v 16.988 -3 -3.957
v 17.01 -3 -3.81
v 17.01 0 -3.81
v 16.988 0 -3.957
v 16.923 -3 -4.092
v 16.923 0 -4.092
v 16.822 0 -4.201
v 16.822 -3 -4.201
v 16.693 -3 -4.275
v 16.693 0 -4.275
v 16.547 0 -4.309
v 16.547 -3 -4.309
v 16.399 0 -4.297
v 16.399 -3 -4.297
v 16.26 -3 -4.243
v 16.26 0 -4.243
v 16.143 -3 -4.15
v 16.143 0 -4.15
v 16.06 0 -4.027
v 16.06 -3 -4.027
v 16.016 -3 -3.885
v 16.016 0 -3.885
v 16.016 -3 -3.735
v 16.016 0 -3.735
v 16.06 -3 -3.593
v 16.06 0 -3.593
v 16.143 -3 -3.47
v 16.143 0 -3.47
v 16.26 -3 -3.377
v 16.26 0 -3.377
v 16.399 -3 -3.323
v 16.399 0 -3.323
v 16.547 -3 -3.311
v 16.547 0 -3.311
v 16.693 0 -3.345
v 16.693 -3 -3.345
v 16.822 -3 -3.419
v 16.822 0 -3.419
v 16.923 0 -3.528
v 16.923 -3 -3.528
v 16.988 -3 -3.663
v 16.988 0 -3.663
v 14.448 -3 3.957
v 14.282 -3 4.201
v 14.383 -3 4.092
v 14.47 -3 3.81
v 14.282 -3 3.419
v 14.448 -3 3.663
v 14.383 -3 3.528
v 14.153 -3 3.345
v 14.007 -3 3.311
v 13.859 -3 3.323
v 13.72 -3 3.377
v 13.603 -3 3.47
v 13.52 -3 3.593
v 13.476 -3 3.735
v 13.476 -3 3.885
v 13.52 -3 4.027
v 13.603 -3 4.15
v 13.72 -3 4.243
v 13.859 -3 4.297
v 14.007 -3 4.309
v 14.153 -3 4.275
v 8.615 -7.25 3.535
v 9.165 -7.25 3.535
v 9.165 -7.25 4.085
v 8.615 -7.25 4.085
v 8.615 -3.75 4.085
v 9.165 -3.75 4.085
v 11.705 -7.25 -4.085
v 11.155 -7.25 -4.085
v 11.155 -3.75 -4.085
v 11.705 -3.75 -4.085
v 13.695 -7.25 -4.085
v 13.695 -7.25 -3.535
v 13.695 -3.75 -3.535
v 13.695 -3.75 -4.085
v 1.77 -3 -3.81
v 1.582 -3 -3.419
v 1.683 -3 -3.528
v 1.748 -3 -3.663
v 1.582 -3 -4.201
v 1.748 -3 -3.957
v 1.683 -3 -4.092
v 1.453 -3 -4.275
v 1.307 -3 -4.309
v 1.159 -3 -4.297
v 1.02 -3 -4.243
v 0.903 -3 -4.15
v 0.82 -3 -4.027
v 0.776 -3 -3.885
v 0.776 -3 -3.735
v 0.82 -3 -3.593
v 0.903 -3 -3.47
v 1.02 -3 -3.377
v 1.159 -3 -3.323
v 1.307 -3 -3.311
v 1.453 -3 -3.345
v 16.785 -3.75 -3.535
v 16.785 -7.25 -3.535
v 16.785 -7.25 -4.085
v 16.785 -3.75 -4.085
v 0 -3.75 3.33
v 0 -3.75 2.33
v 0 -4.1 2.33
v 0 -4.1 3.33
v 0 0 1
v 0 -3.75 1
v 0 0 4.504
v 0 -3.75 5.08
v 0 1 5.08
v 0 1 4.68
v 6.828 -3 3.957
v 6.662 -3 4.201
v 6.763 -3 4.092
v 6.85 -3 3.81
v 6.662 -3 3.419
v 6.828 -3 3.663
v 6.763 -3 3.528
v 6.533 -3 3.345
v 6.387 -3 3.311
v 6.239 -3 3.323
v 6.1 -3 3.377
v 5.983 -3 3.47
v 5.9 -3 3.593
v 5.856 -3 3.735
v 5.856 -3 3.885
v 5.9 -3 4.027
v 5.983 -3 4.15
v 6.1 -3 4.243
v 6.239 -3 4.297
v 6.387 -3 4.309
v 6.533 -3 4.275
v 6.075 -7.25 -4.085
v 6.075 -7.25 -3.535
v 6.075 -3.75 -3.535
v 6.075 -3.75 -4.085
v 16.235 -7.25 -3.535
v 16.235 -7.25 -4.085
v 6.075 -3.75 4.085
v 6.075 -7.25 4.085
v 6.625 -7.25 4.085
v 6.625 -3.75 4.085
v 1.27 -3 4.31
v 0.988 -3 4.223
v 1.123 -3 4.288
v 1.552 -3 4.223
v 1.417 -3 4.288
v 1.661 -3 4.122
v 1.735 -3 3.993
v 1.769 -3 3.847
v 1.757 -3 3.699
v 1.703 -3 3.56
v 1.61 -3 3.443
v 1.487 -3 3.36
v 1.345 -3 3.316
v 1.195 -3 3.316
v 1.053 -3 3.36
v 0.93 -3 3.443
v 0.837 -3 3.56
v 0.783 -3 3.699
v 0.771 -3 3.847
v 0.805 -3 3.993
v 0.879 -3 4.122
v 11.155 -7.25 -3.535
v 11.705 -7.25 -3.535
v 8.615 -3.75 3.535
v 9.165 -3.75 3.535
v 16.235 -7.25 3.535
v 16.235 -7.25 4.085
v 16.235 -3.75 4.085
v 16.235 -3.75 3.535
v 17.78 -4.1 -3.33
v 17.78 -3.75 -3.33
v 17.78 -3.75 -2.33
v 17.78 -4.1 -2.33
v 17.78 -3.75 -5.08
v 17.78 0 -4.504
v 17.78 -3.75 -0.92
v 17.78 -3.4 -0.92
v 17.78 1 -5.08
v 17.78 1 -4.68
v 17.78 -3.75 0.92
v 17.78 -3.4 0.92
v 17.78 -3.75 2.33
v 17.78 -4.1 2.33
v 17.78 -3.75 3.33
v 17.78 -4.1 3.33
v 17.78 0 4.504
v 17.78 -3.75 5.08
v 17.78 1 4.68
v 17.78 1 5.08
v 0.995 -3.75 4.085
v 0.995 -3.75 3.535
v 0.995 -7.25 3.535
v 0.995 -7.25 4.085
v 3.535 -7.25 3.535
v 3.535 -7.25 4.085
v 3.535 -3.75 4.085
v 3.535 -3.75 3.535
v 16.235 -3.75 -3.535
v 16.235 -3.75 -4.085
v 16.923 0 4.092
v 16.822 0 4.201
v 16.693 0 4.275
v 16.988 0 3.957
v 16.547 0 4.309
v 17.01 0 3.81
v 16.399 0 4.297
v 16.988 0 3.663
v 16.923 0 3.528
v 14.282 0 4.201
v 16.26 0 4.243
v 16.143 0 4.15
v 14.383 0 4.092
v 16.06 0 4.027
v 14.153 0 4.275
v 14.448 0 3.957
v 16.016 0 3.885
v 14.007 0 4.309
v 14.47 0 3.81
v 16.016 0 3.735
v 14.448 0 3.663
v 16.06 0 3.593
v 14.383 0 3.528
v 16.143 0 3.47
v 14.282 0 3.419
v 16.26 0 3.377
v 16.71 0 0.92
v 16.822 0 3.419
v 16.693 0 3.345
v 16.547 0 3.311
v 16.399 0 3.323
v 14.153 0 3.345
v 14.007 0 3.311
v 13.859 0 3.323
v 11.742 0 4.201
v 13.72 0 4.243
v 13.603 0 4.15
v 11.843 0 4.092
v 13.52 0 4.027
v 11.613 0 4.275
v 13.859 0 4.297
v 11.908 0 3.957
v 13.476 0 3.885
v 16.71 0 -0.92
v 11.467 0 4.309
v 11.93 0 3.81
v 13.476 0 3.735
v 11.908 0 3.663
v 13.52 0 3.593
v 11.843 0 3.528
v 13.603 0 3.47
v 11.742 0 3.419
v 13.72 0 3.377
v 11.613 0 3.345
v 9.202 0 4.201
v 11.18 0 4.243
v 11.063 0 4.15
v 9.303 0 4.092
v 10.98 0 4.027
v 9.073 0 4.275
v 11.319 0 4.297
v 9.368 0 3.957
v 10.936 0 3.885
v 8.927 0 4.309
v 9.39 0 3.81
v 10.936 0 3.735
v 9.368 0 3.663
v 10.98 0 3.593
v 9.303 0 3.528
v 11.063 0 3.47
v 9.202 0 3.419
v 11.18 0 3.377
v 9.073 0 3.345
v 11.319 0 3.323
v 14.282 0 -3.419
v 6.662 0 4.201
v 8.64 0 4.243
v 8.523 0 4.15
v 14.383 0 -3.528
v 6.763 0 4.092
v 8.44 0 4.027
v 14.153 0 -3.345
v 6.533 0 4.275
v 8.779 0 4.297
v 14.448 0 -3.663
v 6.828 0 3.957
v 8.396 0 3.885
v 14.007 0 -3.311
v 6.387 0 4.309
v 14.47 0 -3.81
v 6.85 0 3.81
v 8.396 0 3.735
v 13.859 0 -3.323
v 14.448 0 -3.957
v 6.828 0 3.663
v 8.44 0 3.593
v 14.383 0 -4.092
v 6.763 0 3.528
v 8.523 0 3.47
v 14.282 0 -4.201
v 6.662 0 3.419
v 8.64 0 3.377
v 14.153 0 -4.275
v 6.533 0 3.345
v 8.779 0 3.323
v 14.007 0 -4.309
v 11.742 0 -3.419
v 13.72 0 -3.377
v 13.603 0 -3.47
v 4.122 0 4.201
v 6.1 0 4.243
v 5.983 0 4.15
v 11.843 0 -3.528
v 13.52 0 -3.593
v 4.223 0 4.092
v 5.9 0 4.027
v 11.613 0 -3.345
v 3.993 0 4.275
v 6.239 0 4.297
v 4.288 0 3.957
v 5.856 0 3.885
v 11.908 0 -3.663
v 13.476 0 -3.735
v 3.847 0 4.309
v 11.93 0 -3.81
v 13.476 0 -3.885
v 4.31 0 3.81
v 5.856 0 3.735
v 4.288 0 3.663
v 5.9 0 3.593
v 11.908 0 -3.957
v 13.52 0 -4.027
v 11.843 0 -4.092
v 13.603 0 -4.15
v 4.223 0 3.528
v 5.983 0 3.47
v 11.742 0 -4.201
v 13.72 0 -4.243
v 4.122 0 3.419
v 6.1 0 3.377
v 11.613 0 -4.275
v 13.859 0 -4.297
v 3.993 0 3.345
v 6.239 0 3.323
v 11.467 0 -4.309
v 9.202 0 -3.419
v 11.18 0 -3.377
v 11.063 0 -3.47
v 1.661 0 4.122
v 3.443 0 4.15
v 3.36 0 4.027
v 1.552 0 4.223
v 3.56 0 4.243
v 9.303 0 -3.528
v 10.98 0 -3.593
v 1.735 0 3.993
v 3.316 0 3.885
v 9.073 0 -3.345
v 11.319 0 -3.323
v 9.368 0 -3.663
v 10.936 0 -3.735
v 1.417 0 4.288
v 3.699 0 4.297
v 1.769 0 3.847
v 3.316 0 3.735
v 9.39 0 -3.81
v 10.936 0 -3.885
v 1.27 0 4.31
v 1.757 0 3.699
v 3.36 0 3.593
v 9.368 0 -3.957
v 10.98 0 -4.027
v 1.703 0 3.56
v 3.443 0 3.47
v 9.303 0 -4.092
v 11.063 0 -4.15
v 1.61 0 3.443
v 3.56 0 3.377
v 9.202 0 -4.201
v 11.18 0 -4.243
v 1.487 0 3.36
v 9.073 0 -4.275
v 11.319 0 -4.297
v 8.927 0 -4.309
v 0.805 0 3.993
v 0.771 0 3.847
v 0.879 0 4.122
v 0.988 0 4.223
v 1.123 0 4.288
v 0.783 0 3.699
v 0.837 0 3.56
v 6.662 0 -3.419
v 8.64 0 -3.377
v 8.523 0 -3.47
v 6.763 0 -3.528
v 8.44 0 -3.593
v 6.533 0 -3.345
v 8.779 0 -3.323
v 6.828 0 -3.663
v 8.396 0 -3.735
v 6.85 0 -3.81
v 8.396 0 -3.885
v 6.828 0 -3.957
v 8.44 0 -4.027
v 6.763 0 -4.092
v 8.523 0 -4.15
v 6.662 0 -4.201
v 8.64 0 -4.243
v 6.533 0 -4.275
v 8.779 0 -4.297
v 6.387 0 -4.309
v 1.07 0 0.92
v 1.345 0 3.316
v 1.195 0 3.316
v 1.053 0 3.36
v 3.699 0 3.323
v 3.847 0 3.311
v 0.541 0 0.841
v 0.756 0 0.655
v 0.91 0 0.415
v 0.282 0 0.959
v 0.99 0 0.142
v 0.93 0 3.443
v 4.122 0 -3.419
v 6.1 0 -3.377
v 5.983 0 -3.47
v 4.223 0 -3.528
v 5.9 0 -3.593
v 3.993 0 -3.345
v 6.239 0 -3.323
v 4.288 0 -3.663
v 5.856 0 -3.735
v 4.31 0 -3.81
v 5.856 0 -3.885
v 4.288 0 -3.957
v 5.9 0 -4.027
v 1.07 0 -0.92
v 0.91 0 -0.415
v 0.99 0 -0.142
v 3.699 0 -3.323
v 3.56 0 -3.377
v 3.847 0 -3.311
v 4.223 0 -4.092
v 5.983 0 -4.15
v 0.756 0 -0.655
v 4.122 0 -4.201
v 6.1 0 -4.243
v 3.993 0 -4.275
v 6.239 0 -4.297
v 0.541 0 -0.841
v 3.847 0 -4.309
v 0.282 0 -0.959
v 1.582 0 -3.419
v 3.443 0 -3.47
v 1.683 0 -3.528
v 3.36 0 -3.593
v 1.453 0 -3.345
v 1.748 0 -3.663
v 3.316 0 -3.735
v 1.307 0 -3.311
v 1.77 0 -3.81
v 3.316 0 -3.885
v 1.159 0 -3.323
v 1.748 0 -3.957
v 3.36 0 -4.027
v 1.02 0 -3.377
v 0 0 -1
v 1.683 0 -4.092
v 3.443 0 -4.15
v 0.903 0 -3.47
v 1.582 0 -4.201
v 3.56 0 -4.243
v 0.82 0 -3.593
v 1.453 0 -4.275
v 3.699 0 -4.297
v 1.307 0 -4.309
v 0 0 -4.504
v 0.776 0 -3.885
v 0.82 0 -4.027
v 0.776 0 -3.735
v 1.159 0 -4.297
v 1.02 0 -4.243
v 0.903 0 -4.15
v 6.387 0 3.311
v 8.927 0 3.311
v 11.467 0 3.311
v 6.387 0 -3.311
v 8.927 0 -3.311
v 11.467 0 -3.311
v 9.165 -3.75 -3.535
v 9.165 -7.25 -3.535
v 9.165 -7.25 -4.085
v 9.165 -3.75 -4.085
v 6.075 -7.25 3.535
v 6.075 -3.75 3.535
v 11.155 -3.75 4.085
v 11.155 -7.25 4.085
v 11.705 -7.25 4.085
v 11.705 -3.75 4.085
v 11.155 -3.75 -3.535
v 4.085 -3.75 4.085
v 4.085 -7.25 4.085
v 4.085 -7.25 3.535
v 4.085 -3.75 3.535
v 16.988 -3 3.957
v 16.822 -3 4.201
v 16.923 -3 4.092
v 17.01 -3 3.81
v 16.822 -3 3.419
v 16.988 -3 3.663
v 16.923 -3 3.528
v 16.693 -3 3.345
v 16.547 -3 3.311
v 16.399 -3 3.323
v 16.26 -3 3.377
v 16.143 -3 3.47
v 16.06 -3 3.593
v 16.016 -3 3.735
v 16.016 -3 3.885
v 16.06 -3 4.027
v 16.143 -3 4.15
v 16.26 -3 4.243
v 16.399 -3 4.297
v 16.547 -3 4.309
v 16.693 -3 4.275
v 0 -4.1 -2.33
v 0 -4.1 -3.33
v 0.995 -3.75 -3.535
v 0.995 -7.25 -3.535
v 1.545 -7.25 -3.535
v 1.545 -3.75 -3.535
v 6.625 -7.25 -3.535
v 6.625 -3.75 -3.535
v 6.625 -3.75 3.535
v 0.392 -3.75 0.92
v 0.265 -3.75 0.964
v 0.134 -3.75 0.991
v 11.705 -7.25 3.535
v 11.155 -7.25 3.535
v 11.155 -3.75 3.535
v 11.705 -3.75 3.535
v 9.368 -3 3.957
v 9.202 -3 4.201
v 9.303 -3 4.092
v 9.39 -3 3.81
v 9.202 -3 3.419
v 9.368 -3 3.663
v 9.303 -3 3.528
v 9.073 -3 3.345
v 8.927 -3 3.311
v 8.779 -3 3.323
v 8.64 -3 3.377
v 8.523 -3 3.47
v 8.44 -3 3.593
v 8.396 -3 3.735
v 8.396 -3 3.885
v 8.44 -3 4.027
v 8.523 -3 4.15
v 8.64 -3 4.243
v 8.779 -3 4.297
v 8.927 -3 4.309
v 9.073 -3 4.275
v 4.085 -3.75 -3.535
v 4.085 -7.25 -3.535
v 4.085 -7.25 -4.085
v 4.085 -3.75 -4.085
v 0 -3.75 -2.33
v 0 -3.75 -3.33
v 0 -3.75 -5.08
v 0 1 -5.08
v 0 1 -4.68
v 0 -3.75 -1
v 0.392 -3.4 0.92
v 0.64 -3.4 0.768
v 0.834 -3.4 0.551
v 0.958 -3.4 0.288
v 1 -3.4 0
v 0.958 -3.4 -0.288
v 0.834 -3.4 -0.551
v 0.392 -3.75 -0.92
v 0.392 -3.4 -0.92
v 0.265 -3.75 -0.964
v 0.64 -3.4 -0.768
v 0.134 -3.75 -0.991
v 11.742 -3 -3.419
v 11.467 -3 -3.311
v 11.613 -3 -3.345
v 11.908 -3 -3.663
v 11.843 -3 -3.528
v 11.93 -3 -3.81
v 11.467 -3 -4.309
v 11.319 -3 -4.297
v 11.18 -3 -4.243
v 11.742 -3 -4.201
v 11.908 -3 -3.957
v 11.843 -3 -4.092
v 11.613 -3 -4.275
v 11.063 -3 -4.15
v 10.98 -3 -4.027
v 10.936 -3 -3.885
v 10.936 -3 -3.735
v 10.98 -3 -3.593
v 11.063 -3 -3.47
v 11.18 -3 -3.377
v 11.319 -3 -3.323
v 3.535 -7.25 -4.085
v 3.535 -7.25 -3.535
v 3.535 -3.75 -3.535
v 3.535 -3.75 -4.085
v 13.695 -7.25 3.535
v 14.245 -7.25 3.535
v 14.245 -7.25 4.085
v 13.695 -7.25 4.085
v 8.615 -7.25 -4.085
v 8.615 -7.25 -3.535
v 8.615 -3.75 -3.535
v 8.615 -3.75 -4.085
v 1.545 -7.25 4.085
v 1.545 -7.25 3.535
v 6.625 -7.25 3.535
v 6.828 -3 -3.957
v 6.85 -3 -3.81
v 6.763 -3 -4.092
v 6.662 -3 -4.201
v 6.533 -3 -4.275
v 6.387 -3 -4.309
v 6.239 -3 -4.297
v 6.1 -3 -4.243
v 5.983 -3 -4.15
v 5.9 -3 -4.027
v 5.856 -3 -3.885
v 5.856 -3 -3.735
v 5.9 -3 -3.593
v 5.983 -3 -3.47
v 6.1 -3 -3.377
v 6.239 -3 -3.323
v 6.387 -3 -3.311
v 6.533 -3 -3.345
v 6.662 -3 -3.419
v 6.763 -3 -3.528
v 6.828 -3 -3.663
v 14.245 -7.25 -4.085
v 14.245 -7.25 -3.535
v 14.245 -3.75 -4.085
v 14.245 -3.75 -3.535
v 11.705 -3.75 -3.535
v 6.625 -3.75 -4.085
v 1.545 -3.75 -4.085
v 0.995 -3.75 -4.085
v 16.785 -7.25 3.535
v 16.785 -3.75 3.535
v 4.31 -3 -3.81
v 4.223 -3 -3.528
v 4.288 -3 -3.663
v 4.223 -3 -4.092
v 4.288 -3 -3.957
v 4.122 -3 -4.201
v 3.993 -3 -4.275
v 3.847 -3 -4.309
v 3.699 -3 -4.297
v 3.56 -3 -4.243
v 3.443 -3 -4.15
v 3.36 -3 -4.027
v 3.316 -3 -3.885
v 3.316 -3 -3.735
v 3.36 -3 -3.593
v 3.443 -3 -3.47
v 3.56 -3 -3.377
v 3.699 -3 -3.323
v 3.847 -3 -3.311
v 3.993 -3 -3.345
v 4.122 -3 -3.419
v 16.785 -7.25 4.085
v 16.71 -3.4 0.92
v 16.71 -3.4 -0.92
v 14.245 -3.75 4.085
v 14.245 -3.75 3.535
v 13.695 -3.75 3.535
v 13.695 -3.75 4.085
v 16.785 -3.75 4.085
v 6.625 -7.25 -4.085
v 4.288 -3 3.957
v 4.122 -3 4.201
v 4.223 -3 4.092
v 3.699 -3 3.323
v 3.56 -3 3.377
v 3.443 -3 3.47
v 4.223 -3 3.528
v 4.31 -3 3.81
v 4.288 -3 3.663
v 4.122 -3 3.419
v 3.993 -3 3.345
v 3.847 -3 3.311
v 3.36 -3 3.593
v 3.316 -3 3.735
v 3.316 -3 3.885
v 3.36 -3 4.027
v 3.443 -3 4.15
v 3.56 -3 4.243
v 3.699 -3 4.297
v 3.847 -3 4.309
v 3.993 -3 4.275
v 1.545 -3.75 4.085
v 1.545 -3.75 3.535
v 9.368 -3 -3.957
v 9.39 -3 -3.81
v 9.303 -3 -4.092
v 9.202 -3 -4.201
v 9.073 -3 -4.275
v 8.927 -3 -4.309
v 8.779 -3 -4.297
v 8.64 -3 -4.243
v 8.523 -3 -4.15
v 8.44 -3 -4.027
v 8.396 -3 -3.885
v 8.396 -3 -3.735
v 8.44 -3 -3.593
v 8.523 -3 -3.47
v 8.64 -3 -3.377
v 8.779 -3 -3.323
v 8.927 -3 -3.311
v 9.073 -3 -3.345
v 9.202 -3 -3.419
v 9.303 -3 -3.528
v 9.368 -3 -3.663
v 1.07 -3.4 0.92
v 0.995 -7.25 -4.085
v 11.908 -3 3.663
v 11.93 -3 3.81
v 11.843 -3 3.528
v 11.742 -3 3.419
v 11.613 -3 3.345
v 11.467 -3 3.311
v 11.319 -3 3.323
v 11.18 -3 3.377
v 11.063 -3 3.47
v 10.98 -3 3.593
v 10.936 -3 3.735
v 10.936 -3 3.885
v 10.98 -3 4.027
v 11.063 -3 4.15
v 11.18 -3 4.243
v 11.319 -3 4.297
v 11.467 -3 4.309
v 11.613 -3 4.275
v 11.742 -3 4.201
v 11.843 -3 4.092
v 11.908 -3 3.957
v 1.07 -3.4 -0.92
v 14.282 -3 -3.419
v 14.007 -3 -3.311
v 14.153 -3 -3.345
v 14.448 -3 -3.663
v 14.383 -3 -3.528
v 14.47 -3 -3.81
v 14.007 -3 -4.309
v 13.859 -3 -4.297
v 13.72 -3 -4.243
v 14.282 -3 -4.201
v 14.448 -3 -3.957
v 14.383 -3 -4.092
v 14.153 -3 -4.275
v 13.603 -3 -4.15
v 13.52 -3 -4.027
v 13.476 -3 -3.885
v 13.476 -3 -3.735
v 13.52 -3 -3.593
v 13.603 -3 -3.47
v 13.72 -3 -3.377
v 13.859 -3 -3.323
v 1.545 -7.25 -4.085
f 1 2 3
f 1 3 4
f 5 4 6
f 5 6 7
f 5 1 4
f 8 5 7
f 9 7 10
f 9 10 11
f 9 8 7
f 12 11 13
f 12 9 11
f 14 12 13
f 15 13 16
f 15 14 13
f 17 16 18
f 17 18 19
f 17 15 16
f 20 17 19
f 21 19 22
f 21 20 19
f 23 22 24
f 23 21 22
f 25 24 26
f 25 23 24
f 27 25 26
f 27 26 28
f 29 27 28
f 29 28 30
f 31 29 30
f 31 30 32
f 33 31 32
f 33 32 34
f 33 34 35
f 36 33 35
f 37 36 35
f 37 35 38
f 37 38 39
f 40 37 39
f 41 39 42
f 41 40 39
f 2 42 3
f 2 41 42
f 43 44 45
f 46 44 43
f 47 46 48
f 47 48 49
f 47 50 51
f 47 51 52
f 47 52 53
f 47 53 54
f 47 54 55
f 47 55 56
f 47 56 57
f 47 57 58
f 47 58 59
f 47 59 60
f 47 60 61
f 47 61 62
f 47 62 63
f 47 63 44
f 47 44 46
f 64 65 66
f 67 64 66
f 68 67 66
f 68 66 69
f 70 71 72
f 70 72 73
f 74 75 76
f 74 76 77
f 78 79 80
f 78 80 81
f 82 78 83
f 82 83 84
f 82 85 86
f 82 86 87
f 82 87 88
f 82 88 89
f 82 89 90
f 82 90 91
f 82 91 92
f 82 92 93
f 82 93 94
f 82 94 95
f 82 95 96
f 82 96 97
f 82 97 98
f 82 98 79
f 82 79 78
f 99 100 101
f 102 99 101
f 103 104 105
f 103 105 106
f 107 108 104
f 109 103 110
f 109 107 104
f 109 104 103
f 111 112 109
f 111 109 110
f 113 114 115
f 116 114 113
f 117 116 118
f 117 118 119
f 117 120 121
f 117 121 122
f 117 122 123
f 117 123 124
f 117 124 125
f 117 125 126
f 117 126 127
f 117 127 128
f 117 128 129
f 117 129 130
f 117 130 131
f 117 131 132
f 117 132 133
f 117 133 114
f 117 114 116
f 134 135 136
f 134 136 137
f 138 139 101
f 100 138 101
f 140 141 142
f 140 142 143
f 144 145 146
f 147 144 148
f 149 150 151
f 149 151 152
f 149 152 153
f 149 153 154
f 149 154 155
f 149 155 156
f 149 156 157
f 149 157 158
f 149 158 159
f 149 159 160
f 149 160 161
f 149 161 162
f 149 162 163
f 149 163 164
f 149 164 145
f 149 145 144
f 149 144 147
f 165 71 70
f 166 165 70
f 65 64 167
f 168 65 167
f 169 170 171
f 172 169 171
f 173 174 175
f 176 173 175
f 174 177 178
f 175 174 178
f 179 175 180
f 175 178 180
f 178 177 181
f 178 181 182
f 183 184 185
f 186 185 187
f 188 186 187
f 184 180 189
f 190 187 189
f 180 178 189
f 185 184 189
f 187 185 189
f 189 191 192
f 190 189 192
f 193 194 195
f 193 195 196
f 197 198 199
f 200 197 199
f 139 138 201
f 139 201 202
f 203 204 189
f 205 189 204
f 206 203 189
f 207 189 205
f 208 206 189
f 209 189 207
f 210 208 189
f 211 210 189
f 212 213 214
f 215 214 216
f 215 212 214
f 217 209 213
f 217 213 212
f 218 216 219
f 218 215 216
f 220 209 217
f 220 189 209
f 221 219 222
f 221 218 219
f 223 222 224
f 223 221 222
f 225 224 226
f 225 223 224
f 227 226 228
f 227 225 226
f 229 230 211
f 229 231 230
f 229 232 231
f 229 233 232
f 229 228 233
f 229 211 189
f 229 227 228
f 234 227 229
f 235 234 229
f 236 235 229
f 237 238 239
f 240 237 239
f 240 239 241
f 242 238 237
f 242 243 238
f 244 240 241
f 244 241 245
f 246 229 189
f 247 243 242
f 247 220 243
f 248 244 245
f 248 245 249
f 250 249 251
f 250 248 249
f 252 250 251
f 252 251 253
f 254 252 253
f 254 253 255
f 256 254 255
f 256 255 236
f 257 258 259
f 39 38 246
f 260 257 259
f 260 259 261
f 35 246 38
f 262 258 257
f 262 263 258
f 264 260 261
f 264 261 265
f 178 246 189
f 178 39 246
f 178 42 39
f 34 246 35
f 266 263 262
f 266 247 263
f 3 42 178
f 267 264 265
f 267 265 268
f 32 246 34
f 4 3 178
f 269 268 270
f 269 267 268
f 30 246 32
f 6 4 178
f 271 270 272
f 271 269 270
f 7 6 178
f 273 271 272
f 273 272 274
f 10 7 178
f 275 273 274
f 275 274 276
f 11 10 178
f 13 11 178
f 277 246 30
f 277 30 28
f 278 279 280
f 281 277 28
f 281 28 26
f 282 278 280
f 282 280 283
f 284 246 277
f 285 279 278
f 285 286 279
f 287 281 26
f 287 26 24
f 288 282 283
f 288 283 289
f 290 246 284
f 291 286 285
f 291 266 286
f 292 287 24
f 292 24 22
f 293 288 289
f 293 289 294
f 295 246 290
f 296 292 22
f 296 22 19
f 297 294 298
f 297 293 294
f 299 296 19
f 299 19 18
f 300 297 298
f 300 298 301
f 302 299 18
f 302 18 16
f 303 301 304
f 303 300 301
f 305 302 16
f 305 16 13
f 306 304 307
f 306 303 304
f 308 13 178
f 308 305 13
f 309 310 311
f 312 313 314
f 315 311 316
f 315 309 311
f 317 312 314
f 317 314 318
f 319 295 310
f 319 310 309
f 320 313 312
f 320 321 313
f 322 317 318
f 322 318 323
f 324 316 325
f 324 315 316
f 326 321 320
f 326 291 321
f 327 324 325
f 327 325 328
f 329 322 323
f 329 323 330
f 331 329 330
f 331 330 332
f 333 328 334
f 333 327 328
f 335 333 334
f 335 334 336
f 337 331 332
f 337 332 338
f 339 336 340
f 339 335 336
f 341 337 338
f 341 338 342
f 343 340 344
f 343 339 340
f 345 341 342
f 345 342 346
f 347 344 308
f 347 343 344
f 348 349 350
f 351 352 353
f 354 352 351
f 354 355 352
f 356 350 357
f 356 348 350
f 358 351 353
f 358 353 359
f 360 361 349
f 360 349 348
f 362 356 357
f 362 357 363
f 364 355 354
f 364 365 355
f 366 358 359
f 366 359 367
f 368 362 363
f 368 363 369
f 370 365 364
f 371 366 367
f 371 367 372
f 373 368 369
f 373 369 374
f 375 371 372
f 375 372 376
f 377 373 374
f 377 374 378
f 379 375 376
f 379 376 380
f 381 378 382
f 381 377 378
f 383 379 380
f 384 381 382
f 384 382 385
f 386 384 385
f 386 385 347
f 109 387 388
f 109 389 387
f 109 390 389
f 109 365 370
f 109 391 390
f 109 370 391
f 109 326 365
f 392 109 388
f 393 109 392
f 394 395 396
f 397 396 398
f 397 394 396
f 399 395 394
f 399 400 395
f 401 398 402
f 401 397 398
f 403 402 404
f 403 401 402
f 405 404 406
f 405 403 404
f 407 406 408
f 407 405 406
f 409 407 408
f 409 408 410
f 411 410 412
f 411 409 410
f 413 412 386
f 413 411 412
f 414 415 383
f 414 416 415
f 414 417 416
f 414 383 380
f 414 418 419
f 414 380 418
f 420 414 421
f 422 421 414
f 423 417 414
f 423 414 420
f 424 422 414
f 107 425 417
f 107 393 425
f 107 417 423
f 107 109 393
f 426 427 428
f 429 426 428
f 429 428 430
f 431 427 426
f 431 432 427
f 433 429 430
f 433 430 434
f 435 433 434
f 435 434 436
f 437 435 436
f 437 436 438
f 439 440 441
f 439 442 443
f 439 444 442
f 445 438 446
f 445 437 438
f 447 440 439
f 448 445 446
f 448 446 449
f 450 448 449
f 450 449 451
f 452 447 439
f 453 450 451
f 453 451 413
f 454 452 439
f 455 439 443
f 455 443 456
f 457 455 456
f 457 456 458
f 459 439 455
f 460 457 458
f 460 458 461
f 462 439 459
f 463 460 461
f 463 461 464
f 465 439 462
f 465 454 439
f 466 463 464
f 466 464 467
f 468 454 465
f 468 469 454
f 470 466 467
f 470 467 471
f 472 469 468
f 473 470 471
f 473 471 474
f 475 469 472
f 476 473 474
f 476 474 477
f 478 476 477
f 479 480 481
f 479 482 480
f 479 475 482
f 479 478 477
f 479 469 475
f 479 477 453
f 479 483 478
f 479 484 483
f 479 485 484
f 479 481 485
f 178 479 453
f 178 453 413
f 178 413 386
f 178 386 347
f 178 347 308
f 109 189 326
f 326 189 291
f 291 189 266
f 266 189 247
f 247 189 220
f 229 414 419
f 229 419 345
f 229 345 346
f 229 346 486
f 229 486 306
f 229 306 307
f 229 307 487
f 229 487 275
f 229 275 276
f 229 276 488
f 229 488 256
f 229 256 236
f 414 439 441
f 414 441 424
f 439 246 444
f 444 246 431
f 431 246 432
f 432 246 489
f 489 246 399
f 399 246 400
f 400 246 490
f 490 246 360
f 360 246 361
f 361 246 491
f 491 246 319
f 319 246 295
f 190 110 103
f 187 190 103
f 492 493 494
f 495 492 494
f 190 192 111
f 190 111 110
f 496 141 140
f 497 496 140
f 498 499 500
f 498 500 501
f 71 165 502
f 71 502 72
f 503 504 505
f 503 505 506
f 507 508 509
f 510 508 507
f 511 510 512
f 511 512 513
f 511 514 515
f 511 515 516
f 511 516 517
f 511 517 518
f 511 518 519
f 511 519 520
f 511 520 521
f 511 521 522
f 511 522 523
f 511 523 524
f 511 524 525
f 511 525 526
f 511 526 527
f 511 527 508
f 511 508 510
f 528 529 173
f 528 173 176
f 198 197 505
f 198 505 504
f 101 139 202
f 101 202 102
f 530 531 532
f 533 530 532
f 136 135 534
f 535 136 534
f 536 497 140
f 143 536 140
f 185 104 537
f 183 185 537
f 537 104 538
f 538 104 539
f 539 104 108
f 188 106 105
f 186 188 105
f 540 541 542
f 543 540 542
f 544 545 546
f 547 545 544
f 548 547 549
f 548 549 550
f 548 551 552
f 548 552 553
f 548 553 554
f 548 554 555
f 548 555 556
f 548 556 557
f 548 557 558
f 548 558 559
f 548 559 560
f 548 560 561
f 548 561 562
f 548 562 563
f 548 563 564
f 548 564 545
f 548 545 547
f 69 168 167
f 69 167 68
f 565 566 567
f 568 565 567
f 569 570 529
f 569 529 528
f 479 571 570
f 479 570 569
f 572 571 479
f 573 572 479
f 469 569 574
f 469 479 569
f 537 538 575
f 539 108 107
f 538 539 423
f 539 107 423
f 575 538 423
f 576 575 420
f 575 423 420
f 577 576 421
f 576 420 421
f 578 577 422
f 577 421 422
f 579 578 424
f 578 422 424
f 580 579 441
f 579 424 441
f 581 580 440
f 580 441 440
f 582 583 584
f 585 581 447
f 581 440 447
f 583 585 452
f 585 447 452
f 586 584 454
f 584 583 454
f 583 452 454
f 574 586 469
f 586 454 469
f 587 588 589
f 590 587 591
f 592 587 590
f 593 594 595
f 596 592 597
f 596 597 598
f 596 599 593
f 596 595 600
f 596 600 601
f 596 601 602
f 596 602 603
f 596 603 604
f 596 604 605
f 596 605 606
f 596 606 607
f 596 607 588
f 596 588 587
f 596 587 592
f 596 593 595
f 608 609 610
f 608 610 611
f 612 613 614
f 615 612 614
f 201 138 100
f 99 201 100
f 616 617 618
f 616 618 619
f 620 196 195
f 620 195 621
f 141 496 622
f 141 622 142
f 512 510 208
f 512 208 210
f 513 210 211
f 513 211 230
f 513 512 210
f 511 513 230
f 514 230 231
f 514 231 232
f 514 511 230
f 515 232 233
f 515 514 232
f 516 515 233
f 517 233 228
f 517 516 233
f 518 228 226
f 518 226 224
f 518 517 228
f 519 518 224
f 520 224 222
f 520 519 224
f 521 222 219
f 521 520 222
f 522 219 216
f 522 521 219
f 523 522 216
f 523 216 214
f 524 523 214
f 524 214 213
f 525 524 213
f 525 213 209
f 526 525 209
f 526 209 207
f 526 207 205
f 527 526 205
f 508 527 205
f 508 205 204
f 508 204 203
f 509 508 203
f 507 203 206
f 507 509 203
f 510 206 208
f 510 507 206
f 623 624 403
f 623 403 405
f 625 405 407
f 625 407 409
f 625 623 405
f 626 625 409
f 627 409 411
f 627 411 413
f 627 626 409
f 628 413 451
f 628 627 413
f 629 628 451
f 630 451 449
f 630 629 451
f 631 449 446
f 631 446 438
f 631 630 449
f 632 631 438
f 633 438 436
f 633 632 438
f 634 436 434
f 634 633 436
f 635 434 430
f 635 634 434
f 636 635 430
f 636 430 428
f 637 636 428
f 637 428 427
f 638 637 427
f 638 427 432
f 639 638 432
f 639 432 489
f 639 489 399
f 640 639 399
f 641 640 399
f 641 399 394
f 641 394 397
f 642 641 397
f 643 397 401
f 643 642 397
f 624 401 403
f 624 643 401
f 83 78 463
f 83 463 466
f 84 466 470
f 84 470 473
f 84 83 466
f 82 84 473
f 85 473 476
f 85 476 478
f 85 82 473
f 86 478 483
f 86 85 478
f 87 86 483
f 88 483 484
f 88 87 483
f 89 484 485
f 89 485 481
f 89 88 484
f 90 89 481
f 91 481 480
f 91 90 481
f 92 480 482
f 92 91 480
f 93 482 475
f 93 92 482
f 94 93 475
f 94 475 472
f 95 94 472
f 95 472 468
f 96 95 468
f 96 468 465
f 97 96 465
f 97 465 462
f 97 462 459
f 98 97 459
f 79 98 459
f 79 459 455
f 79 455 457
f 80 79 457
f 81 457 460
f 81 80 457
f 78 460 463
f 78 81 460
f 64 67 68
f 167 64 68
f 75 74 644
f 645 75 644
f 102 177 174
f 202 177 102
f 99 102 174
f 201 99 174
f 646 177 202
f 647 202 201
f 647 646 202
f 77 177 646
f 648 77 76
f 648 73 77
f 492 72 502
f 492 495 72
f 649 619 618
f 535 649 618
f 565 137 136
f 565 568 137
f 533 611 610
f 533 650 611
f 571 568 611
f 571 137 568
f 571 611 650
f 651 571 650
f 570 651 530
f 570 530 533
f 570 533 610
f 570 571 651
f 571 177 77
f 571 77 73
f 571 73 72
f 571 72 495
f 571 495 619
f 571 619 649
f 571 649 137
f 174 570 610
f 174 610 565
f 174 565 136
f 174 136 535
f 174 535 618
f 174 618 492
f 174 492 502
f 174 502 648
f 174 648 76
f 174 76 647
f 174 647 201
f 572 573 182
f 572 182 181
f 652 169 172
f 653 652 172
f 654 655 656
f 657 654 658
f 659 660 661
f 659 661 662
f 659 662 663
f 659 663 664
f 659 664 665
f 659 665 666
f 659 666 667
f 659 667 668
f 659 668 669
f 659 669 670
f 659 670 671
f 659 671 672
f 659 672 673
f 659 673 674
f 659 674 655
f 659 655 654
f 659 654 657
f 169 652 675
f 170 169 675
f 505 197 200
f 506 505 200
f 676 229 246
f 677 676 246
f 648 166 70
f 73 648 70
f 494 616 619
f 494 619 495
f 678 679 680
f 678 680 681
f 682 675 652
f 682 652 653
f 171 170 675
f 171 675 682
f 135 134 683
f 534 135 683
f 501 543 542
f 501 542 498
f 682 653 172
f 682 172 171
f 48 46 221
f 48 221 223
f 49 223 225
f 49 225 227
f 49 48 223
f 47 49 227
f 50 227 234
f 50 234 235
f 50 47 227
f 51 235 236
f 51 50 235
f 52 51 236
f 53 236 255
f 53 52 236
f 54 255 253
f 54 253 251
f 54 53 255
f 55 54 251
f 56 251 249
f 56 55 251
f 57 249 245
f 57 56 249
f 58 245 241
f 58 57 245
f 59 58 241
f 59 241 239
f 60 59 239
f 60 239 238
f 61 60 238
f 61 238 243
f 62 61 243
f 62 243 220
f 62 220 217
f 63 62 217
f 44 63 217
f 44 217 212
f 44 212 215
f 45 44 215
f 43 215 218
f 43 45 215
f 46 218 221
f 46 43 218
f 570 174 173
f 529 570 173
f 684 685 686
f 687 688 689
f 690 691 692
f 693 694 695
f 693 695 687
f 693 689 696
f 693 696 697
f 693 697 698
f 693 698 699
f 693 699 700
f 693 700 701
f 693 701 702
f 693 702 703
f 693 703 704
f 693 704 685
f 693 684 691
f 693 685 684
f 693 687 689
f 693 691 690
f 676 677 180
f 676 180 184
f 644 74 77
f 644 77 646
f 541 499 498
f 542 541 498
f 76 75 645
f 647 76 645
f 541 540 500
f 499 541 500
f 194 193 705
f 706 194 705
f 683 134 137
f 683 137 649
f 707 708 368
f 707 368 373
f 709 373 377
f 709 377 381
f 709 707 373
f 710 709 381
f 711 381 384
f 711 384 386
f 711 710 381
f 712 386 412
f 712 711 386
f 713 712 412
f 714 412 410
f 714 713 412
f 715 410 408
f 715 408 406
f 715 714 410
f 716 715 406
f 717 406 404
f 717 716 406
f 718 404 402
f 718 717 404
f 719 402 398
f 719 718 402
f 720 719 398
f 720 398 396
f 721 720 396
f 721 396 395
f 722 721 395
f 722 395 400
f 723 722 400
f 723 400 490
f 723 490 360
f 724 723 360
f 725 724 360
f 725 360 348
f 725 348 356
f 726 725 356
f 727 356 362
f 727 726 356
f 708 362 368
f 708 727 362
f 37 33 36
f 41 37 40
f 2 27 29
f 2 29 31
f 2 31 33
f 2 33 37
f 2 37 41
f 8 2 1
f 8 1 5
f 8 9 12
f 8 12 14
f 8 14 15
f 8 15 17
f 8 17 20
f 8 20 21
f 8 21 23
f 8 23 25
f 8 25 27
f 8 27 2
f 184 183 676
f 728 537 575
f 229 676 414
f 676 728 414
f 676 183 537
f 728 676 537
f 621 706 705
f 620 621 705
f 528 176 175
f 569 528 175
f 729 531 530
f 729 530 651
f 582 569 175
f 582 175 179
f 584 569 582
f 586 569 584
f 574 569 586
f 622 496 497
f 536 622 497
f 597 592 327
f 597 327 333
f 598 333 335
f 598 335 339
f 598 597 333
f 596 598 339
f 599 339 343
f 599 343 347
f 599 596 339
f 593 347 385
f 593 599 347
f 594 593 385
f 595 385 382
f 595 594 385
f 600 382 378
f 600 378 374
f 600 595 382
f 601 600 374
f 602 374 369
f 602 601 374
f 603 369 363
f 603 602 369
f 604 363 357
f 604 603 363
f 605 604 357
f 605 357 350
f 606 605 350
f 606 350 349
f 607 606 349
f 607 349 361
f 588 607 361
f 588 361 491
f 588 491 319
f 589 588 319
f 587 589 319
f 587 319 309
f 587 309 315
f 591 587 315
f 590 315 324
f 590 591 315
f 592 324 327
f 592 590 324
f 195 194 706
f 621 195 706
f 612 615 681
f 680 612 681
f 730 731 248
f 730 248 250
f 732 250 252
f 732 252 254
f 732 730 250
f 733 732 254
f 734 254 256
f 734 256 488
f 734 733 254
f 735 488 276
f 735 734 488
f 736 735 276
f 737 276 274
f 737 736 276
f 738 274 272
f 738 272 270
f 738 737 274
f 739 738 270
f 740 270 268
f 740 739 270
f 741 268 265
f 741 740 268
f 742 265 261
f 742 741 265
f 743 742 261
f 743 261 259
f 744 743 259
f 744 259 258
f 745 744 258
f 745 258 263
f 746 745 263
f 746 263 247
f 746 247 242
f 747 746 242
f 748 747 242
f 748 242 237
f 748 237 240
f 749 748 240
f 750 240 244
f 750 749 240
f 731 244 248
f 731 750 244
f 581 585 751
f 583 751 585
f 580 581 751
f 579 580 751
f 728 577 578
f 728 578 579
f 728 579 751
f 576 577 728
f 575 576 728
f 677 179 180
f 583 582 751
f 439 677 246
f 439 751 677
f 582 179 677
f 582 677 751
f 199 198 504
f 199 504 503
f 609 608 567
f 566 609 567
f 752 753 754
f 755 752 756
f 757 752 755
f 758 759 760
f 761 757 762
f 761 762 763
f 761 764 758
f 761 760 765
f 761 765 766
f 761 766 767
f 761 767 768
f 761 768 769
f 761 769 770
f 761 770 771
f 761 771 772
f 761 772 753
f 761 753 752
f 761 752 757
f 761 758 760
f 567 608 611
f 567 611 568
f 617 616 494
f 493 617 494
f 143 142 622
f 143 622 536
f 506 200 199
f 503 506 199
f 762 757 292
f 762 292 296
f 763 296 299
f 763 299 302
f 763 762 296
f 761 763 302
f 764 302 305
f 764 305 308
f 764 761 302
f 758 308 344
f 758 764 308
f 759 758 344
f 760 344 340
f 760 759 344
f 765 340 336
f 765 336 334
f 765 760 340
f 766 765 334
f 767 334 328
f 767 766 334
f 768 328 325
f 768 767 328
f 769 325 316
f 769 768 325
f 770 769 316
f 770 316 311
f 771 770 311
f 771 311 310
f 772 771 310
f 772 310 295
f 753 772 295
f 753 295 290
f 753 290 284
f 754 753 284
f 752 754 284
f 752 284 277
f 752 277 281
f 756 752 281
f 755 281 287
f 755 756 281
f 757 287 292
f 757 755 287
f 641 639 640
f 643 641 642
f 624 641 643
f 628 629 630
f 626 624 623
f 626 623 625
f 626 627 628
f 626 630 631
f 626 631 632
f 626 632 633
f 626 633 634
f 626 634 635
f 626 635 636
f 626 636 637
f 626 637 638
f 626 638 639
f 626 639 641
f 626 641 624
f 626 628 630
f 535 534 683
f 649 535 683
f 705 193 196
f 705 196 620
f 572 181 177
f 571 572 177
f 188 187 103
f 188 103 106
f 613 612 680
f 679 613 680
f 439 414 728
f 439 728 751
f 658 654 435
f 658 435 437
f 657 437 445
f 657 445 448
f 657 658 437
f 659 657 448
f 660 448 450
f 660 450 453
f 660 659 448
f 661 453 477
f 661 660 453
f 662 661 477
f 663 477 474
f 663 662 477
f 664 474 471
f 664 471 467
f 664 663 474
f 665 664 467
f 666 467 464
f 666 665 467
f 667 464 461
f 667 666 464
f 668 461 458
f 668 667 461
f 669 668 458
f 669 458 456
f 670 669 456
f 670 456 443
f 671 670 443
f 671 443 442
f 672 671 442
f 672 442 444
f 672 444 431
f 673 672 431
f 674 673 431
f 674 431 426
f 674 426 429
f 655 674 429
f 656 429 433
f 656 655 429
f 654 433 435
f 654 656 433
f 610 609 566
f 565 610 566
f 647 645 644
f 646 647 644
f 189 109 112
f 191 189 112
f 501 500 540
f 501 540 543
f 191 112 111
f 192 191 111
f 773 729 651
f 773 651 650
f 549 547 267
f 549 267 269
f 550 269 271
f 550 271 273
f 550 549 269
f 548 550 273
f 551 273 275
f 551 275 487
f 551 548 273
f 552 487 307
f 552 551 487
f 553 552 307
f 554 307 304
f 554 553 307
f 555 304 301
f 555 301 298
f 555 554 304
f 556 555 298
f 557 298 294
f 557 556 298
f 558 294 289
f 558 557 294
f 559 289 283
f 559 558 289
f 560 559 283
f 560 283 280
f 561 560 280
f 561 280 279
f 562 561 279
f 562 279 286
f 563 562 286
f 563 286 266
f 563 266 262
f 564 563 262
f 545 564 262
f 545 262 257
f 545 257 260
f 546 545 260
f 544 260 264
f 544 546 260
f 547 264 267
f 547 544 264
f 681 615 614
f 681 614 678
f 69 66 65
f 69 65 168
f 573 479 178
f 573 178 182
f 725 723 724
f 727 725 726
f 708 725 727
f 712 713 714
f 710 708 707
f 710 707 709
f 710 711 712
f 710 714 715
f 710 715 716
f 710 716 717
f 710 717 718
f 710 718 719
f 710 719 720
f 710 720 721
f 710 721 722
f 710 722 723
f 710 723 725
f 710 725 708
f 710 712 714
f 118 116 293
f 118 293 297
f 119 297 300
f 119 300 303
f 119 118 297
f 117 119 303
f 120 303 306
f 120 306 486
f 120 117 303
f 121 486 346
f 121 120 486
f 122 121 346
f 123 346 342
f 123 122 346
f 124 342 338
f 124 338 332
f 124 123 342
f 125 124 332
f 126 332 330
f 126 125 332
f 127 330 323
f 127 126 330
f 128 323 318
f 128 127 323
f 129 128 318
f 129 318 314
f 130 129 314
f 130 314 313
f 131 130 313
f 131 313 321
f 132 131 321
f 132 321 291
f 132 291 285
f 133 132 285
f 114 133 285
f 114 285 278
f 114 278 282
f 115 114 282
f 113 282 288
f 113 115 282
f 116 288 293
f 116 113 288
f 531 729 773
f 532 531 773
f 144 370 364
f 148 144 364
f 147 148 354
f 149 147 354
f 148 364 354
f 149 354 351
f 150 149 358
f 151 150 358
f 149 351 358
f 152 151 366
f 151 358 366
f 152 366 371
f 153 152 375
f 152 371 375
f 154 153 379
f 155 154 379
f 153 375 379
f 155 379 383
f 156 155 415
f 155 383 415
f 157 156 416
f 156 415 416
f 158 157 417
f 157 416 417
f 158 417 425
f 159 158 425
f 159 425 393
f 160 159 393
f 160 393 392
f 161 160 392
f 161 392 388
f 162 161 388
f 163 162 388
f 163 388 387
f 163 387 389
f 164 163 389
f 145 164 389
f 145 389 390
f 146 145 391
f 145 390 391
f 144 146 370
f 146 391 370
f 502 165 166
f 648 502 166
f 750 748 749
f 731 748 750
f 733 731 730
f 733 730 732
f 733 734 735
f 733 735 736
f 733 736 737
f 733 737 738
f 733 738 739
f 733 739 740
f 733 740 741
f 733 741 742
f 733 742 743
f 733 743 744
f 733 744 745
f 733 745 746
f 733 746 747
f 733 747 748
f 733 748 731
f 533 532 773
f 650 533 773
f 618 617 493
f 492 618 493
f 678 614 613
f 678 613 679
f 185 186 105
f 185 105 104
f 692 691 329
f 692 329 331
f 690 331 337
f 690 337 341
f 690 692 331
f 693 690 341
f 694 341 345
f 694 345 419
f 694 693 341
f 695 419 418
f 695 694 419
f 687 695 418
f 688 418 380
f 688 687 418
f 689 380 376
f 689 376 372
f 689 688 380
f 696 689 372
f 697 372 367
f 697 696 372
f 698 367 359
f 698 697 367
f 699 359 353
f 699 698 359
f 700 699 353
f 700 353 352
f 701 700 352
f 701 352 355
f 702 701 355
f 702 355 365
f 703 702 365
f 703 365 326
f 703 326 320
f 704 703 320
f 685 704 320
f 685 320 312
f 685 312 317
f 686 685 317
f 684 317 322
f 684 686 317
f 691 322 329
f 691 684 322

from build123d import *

# Parameters (mm, degrees)
SOCKET_HOUSING_DEPTH  = 17.78
SKETCH3_R             = 0.5
HOLES_DEPTH           = 3
SKETCH4_W             = 0.55
SKETCH4_H             = 0.55
PINS_DEPTH            = 3.5
LPATTERN3_START       = 16.235
LPATTERN3_OUTLINE_W   = 3.5
LPATTERN3_OUTLINE_H   = 0.55
LPATTERN3_DEPTH       = 0.55
LPATTERN3_START_2     = 13.695
LPATTERN3_2_OUTLINE_W = 3.5
LPATTERN3_2_OUTLINE_H = 0.55
LPATTERN3_2_DEPTH     = 0.55
LPATTERN3_START_3     = 11.155
LPATTERN3_3_OUTLINE_W = 3.5
LPATTERN3_3_OUTLINE_H = 0.55
LPATTERN3_3_DEPTH     = 0.55
LPATTERN3_START_4     = 8.615
LPATTERN3_4_OUTLINE_W = 3.5
LPATTERN3_4_OUTLINE_H = 0.55
LPATTERN3_4_DEPTH     = 0.55
LPATTERN3_START_5     = 6.075
LPATTERN3_5_OUTLINE_W = 3.5
LPATTERN3_5_OUTLINE_H = 0.55
LPATTERN3_5_DEPTH     = 0.55
LPATTERN3_START_6     = 3.535
LPATTERN3_6_OUTLINE_W = 3.5
LPATTERN3_6_OUTLINE_H = 0.55
LPATTERN3_6_DEPTH     = 0.55
LPATTERN3_START_7     = -3
LPATTERN3_7_OUTLINE_R = 0.5
LPATTERN3_7_DEPTH     = 3
MIRROR2_START         = -3
MIRROR2_OUTLINE_R     = 0.5
MIRROR2_DEPTH         = 3
MIRROR2_START_2       = -7.25
MIRROR2_2_OUTLINE_W   = 0.55
MIRROR2_2_OUTLINE_H   = 0.55
MIRROR2_2_DEPTH       = 3.5
SKETCH5_W             = 15.64
SKETCH5_H             = 1.84
CUT_EXTRUDE3_DEPTH    = 20.861956097


# Read off the part's stored shape, not the designer's step: LPattern3, Mirror2
with BuildPart() as part:
    # Sketch2 → socket_housing (new body)
    with BuildSketch(Plane(origin=(0, 0, 0), x_dir=(0, 0, -1), z_dir=(1, 0, 0))):
        Polygon((-5.08, -3.75), (-3.33, -3.75), (-3.33, -4.1), (-2.33, -4.1), (-2.33, -3.75), (-0.92, -3.75), (-0.92, -3.4), (0, -3.4), (0, 0), (-4.503673019, 0), (-4.68, 1), (-5.08, 1), align=None)
    socket_housing = extrude(amount=SOCKET_HOUSING_DEPTH)

    # Sketch3 → holes (cut)
    with BuildSketch(Plane(origin=(0, 0, 0), x_dir=(1, 0, 0), z_dir=(0, 1, 0))):
        with Locations(Location((1.27, -3.81, 0), (0, 0, 270))):
            Circle(SKETCH3_R)
    extrude(amount=-HOLES_DEPTH, mode=Mode.SUBTRACT)

    # LPattern3 7 outline → LPattern3 7 (cut)
    with BuildSketch(Plane(origin=(0, 0, 0), x_dir=(1, 0, 0), z_dir=(0, 1, 0)).offset(LPATTERN3_START_7)):
        with Locations((16.51, -3.81)):
            Circle(LPATTERN3_7_OUTLINE_R)
        with Locations((13.97, -3.81)):
            Circle(LPATTERN3_7_OUTLINE_R)
        with Locations((11.43, -3.81)):
            Circle(LPATTERN3_7_OUTLINE_R)
        with Locations((8.89, -3.81)):
            Circle(LPATTERN3_7_OUTLINE_R)
        with Locations((6.35, -3.81)):
            Circle(LPATTERN3_7_OUTLINE_R)
        with Locations((3.81, -3.81)):
            Circle(LPATTERN3_7_OUTLINE_R)
    extrude(amount=LPATTERN3_7_DEPTH, mode=Mode.SUBTRACT)

    # Mirror1: socket_housing across plane
    add(socket_housing.mirror(Plane.XY))

    # Mirror2 outline → Mirror2 (cut)
    with BuildSketch(Plane(origin=(0, 0, 0), x_dir=(1, 0, 0), z_dir=(0, 1, 0)).offset(MIRROR2_START)):
        with Locations((16.51, 3.81)):
            Circle(MIRROR2_OUTLINE_R)
        with Locations((13.97, 3.81)):
            Circle(MIRROR2_OUTLINE_R)
        with Locations((11.43, 3.81)):
            Circle(MIRROR2_OUTLINE_R)
        with Locations((8.89, 3.81)):
            Circle(MIRROR2_OUTLINE_R)
        with Locations((6.35, 3.81)):
            Circle(MIRROR2_OUTLINE_R)
        with Locations((3.81, 3.81)):
            Circle(MIRROR2_OUTLINE_R)
        with Locations((1.27, 3.81)):
            Circle(MIRROR2_OUTLINE_R)
    extrude(amount=MIRROR2_DEPTH, mode=Mode.SUBTRACT)

    # Mirror2 2 outline → Mirror2 2 (add)
    with BuildSketch(Plane(origin=(0, 0, 0), x_dir=(1, 0, 0), z_dir=(0, 1, 0)).offset(MIRROR2_START_2)):
        with Locations((16.51, 3.81)):
            Rectangle(MIRROR2_2_OUTLINE_W, MIRROR2_2_OUTLINE_H)
        with Locations((13.97, 3.81)):
            Rectangle(MIRROR2_2_OUTLINE_W, MIRROR2_2_OUTLINE_H)
        with Locations((11.43, 3.81)):
            Rectangle(MIRROR2_2_OUTLINE_W, MIRROR2_2_OUTLINE_H)
        with Locations((8.89, 3.81)):
            Rectangle(MIRROR2_2_OUTLINE_W, MIRROR2_2_OUTLINE_H)
        with Locations((6.35, 3.81)):
            Rectangle(MIRROR2_2_OUTLINE_W, MIRROR2_2_OUTLINE_H)
        with Locations((3.81, 3.81)):
            Rectangle(MIRROR2_2_OUTLINE_W, MIRROR2_2_OUTLINE_H)
        with Locations((1.27, 3.81)):
            Rectangle(MIRROR2_2_OUTLINE_W, MIRROR2_2_OUTLINE_H)
    extrude(amount=MIRROR2_2_DEPTH)

    # Sketch5 → Cut-Extrude3 (cut, through all)
    with BuildSketch(Plane(origin=(0, 0, 0), x_dir=(1, 0, 0), z_dir=(0, 1, 0))):
        with BuildLine():
            Line((0, 1), (0, -1))
            ThreePointArc((0, -1), (1, 0), (0, 1))
        make_face()
        with Locations((8.89, 0)):
            Rectangle(SKETCH5_W, SKETCH5_H)
    extrude(amount=-CUT_EXTRUDE3_DEPTH, mode=Mode.SUBTRACT)


with BuildPart() as body_2:
    # Sketch4 → pins (new body)
    with BuildSketch(Plane.XZ.offset(3.75)):
        with Locations((1.27, 3.81)):
            Rectangle(SKETCH4_W, SKETCH4_H)
    extrude(amount=PINS_DEPTH)


with BuildPart() as body_3:
    # LPattern3 outline → LPattern3 (new body)
    with BuildSketch(Plane.YZ.offset(LPATTERN3_START)):
        with Locations((-5.5, 3.81)):
            Rectangle(LPATTERN3_OUTLINE_W, LPATTERN3_OUTLINE_H)
    extrude(amount=LPATTERN3_DEPTH)


with BuildPart() as body_4:
    # LPattern3 2 outline → LPattern3 2 (new body)
    with BuildSketch(Plane.YZ.offset(LPATTERN3_START_2)):
        with Locations((-5.5, 3.81)):
            Rectangle(LPATTERN3_2_OUTLINE_W, LPATTERN3_2_OUTLINE_H)
    extrude(amount=LPATTERN3_2_DEPTH)


with BuildPart() as body_5:
    # LPattern3 3 outline → LPattern3 3 (new body)
    with BuildSketch(Plane.YZ.offset(LPATTERN3_START_3)):
        with Locations((-5.5, 3.81)):
            Rectangle(LPATTERN3_3_OUTLINE_W, LPATTERN3_3_OUTLINE_H)
    extrude(amount=LPATTERN3_3_DEPTH)


with BuildPart() as body_6:
    # LPattern3 4 outline → LPattern3 4 (new body)
    with BuildSketch(Plane.YZ.offset(LPATTERN3_START_4)):
        with Locations((-5.5, 3.81)):
            Rectangle(LPATTERN3_4_OUTLINE_W, LPATTERN3_4_OUTLINE_H)
    extrude(amount=LPATTERN3_4_DEPTH)


with BuildPart() as body_7:
    # LPattern3 5 outline → LPattern3 5 (new body)
    with BuildSketch(Plane.YZ.offset(LPATTERN3_START_5)):
        with Locations((-5.5, 3.81)):
            Rectangle(LPATTERN3_5_OUTLINE_W, LPATTERN3_5_OUTLINE_H)
    extrude(amount=LPATTERN3_5_DEPTH)


with BuildPart() as body_8:
    # LPattern3 6 outline → LPattern3 6 (new body)
    with BuildSketch(Plane.YZ.offset(LPATTERN3_START_6)):
        with Locations((-5.5, 3.81)):
            Rectangle(LPATTERN3_6_OUTLINE_W, LPATTERN3_6_OUTLINE_H)
    extrude(amount=LPATTERN3_6_DEPTH)


solid = Compound([part.part, body_2.part, body_3.part, body_4.part, body_5.part, body_6.part, body_7.part, body_8.part])
